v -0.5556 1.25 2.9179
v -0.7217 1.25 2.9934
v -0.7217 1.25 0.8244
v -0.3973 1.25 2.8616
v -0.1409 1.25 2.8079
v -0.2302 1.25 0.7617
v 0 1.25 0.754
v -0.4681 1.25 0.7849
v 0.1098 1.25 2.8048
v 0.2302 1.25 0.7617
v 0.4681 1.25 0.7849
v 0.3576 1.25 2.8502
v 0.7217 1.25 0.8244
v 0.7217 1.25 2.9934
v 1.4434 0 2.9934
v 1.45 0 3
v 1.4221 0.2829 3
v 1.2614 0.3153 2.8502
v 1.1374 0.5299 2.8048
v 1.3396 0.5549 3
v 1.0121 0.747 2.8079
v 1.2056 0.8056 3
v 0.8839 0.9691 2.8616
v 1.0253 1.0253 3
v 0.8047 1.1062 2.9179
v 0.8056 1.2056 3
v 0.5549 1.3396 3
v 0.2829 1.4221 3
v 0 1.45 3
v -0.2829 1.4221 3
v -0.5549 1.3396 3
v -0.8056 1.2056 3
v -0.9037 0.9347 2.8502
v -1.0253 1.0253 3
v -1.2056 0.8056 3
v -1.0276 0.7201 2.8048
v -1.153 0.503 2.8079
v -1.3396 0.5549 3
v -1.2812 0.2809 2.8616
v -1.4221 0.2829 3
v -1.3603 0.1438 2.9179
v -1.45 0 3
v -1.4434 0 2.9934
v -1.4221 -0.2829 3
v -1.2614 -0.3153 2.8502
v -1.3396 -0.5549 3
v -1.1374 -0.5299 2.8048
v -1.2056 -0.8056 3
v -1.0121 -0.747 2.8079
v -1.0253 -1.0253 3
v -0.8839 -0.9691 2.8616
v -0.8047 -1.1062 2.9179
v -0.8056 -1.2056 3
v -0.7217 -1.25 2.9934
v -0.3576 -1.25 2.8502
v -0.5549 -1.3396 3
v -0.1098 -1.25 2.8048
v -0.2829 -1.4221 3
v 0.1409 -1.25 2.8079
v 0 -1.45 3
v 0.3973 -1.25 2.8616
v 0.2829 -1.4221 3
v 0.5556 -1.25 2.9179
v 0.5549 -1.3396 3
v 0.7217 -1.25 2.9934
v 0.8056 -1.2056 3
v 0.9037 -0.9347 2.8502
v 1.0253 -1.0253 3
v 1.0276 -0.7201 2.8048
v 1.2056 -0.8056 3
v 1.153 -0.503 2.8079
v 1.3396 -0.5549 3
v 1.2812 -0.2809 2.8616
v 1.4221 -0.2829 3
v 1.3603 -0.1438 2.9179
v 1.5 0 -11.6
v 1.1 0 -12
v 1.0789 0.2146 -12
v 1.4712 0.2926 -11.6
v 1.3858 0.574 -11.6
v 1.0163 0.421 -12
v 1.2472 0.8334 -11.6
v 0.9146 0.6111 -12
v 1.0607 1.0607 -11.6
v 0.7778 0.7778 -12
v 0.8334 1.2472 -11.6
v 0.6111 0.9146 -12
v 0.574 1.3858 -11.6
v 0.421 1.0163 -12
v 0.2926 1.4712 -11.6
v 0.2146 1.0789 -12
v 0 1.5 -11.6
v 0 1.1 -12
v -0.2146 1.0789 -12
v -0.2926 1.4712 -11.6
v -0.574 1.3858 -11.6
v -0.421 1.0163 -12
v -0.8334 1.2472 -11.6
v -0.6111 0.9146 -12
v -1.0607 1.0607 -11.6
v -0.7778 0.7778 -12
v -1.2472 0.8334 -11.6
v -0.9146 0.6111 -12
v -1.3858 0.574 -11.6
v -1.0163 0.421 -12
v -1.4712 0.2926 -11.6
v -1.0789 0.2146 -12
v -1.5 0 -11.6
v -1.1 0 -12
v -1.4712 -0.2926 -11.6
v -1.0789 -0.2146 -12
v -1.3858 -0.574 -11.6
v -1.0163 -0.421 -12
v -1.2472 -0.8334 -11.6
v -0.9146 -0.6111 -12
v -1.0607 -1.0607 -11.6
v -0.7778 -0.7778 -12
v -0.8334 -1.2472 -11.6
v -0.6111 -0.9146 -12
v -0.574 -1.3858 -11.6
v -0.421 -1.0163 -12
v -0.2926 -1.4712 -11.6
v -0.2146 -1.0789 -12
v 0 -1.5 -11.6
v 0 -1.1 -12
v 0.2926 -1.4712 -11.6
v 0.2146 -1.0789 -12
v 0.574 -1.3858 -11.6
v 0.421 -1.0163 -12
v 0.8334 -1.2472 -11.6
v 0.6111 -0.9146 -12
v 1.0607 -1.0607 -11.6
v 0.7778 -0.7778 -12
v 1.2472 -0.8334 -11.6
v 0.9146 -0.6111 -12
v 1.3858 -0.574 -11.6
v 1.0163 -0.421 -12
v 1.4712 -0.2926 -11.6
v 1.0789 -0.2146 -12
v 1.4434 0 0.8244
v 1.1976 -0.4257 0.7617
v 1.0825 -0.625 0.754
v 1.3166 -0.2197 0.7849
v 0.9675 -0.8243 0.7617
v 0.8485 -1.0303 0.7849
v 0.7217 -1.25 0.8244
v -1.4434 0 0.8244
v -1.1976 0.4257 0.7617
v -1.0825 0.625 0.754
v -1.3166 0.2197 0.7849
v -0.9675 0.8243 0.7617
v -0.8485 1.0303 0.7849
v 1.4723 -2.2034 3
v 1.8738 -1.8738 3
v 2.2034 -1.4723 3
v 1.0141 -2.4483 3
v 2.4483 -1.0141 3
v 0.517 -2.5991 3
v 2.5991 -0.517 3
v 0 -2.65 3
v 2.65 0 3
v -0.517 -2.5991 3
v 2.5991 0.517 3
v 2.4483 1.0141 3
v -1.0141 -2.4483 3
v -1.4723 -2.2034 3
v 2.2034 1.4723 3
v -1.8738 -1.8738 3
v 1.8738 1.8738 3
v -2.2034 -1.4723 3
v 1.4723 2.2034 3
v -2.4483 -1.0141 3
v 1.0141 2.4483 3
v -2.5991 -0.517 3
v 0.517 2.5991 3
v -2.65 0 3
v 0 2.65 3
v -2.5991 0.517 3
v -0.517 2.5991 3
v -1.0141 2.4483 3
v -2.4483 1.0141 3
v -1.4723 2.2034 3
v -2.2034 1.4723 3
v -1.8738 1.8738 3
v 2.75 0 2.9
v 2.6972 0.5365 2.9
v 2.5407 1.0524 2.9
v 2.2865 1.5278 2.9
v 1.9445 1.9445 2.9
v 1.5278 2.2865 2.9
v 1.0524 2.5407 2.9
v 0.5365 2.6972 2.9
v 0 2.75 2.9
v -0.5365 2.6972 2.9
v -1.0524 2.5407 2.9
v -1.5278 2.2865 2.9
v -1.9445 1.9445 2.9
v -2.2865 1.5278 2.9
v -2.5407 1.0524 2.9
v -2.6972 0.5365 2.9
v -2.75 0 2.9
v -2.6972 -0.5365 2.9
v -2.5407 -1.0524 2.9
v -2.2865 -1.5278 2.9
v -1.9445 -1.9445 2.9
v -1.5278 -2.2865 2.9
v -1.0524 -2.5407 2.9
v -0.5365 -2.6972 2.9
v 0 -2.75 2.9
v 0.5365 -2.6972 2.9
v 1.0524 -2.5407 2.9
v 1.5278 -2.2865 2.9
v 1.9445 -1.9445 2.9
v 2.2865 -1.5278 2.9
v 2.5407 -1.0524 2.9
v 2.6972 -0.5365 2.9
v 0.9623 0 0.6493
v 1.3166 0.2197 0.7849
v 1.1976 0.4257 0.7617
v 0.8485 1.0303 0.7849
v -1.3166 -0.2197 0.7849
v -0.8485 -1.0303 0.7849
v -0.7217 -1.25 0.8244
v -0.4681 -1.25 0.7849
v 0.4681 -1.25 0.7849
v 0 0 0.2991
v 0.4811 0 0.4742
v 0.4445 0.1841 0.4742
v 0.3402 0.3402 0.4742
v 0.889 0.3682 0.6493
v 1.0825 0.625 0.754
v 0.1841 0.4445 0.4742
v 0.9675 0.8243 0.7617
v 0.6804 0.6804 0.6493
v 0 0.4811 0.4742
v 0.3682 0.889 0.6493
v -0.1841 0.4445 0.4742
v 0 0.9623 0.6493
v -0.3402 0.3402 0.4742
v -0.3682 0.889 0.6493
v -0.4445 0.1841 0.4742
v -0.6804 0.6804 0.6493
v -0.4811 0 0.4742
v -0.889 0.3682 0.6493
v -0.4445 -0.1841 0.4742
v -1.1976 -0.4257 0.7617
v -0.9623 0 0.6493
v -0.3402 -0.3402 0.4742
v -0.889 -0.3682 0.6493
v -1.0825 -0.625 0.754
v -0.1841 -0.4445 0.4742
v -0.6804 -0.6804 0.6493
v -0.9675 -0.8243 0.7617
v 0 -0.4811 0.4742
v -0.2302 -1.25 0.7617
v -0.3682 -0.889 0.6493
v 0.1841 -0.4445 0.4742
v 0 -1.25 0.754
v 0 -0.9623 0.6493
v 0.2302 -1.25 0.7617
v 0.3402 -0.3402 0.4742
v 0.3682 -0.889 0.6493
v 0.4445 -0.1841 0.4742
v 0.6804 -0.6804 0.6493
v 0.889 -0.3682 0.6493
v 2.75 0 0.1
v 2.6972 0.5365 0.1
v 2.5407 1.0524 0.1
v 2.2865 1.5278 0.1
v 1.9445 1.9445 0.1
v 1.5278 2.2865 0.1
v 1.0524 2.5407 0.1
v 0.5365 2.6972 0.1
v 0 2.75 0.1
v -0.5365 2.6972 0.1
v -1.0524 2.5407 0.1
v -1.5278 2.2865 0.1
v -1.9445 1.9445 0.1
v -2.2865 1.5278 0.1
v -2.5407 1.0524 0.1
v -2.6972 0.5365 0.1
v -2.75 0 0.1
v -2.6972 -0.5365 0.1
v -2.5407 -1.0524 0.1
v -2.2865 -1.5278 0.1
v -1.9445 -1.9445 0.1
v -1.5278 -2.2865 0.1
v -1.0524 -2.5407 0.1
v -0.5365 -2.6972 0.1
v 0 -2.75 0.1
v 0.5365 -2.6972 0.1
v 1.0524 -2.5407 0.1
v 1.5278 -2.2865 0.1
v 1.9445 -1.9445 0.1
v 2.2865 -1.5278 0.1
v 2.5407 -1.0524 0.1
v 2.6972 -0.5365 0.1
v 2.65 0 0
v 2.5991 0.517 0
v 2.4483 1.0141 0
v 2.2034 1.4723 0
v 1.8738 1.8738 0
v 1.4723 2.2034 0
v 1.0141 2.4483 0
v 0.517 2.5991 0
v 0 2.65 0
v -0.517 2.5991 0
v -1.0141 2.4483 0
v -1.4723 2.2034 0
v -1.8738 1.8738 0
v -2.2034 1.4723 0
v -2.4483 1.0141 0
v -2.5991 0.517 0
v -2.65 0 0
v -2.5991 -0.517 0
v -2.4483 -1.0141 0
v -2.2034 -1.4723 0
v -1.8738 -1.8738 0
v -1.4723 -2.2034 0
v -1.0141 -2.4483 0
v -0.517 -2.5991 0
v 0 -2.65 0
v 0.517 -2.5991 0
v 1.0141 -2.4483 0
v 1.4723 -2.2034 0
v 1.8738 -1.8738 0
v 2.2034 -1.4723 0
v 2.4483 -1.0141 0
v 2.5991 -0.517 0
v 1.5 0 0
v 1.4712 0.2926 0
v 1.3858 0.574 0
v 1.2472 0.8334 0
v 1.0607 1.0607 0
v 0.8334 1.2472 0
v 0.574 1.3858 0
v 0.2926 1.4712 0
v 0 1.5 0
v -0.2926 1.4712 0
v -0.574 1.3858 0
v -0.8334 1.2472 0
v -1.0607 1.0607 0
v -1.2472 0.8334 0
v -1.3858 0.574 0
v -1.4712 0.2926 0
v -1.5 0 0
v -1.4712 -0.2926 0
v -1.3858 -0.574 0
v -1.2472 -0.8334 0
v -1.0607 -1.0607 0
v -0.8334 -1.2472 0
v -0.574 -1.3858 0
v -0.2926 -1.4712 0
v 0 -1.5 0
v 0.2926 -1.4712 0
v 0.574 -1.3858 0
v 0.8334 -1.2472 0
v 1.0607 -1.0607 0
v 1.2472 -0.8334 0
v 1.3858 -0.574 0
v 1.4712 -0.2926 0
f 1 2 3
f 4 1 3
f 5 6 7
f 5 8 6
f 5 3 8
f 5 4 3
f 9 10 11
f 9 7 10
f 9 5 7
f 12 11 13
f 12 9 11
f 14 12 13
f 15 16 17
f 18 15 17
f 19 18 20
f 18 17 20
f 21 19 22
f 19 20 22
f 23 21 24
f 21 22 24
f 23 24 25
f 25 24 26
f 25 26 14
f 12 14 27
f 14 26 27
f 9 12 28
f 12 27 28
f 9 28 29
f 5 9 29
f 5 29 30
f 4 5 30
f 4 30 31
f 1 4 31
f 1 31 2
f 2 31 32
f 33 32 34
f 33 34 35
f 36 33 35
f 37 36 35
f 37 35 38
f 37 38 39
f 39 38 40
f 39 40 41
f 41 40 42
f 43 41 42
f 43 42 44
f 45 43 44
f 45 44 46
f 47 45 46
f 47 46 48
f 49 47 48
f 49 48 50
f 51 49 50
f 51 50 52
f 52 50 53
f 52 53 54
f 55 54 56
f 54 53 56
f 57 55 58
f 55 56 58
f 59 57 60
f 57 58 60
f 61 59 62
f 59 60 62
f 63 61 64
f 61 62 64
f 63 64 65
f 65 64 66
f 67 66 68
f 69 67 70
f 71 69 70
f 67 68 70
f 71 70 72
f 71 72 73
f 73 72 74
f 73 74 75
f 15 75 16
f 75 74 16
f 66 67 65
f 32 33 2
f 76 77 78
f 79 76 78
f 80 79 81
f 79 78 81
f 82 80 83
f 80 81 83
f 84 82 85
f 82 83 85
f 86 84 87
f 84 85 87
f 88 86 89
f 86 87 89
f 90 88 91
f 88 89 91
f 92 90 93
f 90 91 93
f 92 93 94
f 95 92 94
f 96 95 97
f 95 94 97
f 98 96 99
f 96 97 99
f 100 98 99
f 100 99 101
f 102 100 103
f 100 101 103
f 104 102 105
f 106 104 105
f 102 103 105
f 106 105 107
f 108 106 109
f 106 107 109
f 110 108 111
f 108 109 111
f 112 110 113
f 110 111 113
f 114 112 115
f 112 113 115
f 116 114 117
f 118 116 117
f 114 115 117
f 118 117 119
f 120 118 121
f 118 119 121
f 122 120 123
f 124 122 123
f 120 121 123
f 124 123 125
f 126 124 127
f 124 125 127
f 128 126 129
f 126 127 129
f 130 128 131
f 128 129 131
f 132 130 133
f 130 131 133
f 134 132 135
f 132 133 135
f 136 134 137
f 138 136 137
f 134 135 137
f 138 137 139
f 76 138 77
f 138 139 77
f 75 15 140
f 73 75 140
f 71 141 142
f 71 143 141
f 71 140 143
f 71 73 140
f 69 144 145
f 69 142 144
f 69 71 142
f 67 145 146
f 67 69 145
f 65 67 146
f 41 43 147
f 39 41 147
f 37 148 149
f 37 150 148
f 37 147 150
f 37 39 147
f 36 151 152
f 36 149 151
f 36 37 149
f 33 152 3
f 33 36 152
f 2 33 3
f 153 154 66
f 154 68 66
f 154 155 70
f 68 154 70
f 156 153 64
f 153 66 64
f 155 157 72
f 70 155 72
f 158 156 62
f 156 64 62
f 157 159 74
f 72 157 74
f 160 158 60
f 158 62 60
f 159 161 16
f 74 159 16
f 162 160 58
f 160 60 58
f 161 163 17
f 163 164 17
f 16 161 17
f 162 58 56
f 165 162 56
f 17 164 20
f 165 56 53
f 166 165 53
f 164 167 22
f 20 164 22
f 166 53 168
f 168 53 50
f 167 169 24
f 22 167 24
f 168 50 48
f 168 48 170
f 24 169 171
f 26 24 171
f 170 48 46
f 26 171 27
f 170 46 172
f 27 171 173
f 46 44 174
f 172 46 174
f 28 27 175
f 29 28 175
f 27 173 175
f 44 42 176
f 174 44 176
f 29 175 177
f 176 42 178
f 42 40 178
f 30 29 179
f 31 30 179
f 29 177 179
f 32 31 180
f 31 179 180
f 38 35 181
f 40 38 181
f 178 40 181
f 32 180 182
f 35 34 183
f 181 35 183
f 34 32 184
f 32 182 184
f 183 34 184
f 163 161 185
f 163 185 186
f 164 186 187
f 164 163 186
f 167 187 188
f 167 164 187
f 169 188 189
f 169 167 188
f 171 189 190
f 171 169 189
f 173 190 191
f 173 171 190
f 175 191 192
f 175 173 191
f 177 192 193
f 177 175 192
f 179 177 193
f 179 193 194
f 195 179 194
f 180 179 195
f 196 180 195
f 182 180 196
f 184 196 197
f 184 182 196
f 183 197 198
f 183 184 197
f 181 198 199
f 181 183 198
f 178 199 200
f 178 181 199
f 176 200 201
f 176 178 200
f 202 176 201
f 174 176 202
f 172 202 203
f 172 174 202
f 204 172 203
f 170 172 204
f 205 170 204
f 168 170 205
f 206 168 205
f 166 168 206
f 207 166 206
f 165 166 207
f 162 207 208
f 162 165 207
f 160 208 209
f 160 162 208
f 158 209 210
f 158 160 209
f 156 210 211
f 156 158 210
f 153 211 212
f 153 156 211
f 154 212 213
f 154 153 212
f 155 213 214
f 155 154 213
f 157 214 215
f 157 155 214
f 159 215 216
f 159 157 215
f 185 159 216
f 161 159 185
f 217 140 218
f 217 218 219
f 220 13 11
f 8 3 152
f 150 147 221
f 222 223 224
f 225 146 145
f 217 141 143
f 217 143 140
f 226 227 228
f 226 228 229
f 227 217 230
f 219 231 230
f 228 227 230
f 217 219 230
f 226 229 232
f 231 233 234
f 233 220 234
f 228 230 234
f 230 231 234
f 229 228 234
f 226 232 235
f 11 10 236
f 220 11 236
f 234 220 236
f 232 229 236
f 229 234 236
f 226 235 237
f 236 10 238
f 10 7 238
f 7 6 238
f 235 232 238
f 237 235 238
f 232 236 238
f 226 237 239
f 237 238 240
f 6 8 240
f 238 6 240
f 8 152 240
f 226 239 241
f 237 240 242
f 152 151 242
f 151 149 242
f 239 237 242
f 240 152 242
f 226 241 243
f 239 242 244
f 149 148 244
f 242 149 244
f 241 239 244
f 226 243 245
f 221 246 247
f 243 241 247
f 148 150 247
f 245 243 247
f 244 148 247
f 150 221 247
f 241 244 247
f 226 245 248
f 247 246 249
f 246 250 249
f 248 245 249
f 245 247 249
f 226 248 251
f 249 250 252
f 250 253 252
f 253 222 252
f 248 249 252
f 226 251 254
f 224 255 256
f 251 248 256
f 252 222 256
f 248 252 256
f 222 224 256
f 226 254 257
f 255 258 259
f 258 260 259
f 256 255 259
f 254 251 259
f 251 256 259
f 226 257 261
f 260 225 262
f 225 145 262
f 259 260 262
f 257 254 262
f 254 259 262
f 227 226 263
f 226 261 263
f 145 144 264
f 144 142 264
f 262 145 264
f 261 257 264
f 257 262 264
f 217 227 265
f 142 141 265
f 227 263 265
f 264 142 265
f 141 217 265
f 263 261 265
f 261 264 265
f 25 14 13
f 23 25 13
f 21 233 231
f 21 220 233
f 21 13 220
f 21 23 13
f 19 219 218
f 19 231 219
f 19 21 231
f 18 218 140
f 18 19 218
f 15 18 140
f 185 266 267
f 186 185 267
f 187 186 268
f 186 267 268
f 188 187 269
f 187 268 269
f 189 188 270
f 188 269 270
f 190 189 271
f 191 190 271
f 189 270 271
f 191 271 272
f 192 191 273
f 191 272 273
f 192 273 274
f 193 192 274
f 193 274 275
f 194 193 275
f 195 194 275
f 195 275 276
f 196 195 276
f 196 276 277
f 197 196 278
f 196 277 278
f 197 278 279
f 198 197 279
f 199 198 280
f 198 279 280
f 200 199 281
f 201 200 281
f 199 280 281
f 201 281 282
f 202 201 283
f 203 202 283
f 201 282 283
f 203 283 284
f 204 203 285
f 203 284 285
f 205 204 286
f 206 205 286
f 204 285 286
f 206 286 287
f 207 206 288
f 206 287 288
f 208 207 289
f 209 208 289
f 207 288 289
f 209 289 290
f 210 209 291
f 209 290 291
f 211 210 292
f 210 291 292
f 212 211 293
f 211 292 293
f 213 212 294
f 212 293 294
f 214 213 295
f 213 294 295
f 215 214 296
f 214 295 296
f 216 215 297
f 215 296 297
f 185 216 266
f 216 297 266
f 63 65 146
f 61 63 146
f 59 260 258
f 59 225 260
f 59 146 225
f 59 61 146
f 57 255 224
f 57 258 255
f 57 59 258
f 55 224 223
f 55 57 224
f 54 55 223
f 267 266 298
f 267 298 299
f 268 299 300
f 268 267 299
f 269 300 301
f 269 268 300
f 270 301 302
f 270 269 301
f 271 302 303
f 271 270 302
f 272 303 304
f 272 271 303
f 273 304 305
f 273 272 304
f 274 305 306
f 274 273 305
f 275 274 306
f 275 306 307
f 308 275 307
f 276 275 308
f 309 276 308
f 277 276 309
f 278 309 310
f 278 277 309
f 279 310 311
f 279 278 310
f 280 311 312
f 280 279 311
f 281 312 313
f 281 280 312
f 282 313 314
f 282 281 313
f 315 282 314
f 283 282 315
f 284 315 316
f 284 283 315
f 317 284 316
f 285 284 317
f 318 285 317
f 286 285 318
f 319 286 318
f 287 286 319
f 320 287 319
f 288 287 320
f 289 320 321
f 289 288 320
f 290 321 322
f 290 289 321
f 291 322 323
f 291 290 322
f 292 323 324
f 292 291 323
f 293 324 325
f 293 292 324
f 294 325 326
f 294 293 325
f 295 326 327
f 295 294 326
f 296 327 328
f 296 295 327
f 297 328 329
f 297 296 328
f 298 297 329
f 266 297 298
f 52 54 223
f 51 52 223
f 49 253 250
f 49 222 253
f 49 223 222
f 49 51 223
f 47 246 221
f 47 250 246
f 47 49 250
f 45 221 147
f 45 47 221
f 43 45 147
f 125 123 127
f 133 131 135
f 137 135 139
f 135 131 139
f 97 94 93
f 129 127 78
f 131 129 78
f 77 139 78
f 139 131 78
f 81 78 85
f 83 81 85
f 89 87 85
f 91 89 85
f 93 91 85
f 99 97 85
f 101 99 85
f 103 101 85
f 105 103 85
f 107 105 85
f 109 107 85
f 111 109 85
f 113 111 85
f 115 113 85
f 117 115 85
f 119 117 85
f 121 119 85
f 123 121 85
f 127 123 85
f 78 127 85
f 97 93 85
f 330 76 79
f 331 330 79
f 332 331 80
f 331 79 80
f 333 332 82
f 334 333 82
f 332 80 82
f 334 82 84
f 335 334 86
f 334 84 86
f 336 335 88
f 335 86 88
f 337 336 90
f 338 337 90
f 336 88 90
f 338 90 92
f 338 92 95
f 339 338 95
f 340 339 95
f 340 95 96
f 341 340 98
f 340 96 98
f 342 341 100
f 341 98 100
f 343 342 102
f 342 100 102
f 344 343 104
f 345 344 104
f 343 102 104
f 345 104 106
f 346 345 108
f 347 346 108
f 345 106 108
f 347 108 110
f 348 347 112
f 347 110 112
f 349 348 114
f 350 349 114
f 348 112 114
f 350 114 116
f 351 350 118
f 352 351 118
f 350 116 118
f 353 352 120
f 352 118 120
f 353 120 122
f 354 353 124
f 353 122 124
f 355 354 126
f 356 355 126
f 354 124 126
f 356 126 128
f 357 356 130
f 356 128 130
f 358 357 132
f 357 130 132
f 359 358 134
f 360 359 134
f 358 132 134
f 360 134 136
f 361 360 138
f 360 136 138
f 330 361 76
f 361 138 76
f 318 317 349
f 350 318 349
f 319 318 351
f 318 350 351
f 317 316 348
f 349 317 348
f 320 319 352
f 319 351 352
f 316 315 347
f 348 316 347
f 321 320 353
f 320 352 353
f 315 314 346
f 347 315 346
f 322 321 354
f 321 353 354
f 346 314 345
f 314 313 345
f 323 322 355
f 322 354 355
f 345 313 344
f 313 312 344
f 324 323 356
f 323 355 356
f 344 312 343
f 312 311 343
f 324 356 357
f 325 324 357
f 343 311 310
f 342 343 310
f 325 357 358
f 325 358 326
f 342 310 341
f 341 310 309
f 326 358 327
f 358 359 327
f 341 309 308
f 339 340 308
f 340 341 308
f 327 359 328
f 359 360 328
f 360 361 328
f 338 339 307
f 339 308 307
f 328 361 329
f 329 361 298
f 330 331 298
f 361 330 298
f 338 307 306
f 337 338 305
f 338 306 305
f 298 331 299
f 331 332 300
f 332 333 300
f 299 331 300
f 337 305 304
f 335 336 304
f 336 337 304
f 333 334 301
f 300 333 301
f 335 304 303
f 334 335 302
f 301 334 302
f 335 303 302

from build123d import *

# Parameters (mm, degrees)
SKETCH014_R     = 3.75
POCKET006_DEPTH = 9.70192
CHAMFER007_SIZE = 0.4
CHAMFER006_SIZE = 0.1


with BuildPart() as pocket006:
    # Sketch015 → Revolution006 (revolve)
    with BuildSketch(Plane.XZ):
        Polygon((0, 0.29908), (2.75, 1.3), (2.75, 10), (0, 10), align=None)
    revolve(axis=Axis((0, 0, 0), (0, 0, 1)))

    # Sketch014 (on Face3 of Revolution006) → Pocket006 (cut, through all)
    with BuildSketch(Plane(origin=(0, 0, 10), x_dir=(-1, 0, 0), z_dir=(0, 0, 1))):
        Circle(SKETCH014_R)
        Polygon((-0.721688, 1.25), (0.721688, 1.25), (1.443376, 0), (0.721688, -1.25), (-0.721688, -1.25), (-1.443376, 0), align=None, mode=Mode.SUBTRACT)
    extrude(amount=-POCKET006_DEPTH, mode=Mode.SUBTRACT)


with BuildPart() as chamfer006:
    # Sketch016 → Revolution007 (revolve)
    with BuildSketch(Plane.XZ):
        Polygon((1.45, 3), (2.75, 3), (2.75, 0), (1.5, 0), (1.5, -12), (0, -12), (0, 1.549999), align=None)
    revolve(axis=Axis((0, 0, 0), (0, 0, 1)))

    # Cut003: cut Pocket006
    add(pocket006.part, mode=Mode.SUBTRACT)

    # Chamfer007
    chamfer007_edges = [chamfer006.edges().sort_by_distance(p)[0] for p in [
        (-1.5, 0, -12),
    ]]
    chamfer(chamfer007_edges, length=CHAMFER007_SIZE)

    # Chamfer006
    chamfer006_edges = [chamfer006.edges().sort_by_distance(p)[0] for p in [
        (-2.75, 0, 0),
        (-2.75, 0, 3),
    ]]
    chamfer(chamfer006_edges, length=CHAMFER006_SIZE)


solid = chamfer006.part
